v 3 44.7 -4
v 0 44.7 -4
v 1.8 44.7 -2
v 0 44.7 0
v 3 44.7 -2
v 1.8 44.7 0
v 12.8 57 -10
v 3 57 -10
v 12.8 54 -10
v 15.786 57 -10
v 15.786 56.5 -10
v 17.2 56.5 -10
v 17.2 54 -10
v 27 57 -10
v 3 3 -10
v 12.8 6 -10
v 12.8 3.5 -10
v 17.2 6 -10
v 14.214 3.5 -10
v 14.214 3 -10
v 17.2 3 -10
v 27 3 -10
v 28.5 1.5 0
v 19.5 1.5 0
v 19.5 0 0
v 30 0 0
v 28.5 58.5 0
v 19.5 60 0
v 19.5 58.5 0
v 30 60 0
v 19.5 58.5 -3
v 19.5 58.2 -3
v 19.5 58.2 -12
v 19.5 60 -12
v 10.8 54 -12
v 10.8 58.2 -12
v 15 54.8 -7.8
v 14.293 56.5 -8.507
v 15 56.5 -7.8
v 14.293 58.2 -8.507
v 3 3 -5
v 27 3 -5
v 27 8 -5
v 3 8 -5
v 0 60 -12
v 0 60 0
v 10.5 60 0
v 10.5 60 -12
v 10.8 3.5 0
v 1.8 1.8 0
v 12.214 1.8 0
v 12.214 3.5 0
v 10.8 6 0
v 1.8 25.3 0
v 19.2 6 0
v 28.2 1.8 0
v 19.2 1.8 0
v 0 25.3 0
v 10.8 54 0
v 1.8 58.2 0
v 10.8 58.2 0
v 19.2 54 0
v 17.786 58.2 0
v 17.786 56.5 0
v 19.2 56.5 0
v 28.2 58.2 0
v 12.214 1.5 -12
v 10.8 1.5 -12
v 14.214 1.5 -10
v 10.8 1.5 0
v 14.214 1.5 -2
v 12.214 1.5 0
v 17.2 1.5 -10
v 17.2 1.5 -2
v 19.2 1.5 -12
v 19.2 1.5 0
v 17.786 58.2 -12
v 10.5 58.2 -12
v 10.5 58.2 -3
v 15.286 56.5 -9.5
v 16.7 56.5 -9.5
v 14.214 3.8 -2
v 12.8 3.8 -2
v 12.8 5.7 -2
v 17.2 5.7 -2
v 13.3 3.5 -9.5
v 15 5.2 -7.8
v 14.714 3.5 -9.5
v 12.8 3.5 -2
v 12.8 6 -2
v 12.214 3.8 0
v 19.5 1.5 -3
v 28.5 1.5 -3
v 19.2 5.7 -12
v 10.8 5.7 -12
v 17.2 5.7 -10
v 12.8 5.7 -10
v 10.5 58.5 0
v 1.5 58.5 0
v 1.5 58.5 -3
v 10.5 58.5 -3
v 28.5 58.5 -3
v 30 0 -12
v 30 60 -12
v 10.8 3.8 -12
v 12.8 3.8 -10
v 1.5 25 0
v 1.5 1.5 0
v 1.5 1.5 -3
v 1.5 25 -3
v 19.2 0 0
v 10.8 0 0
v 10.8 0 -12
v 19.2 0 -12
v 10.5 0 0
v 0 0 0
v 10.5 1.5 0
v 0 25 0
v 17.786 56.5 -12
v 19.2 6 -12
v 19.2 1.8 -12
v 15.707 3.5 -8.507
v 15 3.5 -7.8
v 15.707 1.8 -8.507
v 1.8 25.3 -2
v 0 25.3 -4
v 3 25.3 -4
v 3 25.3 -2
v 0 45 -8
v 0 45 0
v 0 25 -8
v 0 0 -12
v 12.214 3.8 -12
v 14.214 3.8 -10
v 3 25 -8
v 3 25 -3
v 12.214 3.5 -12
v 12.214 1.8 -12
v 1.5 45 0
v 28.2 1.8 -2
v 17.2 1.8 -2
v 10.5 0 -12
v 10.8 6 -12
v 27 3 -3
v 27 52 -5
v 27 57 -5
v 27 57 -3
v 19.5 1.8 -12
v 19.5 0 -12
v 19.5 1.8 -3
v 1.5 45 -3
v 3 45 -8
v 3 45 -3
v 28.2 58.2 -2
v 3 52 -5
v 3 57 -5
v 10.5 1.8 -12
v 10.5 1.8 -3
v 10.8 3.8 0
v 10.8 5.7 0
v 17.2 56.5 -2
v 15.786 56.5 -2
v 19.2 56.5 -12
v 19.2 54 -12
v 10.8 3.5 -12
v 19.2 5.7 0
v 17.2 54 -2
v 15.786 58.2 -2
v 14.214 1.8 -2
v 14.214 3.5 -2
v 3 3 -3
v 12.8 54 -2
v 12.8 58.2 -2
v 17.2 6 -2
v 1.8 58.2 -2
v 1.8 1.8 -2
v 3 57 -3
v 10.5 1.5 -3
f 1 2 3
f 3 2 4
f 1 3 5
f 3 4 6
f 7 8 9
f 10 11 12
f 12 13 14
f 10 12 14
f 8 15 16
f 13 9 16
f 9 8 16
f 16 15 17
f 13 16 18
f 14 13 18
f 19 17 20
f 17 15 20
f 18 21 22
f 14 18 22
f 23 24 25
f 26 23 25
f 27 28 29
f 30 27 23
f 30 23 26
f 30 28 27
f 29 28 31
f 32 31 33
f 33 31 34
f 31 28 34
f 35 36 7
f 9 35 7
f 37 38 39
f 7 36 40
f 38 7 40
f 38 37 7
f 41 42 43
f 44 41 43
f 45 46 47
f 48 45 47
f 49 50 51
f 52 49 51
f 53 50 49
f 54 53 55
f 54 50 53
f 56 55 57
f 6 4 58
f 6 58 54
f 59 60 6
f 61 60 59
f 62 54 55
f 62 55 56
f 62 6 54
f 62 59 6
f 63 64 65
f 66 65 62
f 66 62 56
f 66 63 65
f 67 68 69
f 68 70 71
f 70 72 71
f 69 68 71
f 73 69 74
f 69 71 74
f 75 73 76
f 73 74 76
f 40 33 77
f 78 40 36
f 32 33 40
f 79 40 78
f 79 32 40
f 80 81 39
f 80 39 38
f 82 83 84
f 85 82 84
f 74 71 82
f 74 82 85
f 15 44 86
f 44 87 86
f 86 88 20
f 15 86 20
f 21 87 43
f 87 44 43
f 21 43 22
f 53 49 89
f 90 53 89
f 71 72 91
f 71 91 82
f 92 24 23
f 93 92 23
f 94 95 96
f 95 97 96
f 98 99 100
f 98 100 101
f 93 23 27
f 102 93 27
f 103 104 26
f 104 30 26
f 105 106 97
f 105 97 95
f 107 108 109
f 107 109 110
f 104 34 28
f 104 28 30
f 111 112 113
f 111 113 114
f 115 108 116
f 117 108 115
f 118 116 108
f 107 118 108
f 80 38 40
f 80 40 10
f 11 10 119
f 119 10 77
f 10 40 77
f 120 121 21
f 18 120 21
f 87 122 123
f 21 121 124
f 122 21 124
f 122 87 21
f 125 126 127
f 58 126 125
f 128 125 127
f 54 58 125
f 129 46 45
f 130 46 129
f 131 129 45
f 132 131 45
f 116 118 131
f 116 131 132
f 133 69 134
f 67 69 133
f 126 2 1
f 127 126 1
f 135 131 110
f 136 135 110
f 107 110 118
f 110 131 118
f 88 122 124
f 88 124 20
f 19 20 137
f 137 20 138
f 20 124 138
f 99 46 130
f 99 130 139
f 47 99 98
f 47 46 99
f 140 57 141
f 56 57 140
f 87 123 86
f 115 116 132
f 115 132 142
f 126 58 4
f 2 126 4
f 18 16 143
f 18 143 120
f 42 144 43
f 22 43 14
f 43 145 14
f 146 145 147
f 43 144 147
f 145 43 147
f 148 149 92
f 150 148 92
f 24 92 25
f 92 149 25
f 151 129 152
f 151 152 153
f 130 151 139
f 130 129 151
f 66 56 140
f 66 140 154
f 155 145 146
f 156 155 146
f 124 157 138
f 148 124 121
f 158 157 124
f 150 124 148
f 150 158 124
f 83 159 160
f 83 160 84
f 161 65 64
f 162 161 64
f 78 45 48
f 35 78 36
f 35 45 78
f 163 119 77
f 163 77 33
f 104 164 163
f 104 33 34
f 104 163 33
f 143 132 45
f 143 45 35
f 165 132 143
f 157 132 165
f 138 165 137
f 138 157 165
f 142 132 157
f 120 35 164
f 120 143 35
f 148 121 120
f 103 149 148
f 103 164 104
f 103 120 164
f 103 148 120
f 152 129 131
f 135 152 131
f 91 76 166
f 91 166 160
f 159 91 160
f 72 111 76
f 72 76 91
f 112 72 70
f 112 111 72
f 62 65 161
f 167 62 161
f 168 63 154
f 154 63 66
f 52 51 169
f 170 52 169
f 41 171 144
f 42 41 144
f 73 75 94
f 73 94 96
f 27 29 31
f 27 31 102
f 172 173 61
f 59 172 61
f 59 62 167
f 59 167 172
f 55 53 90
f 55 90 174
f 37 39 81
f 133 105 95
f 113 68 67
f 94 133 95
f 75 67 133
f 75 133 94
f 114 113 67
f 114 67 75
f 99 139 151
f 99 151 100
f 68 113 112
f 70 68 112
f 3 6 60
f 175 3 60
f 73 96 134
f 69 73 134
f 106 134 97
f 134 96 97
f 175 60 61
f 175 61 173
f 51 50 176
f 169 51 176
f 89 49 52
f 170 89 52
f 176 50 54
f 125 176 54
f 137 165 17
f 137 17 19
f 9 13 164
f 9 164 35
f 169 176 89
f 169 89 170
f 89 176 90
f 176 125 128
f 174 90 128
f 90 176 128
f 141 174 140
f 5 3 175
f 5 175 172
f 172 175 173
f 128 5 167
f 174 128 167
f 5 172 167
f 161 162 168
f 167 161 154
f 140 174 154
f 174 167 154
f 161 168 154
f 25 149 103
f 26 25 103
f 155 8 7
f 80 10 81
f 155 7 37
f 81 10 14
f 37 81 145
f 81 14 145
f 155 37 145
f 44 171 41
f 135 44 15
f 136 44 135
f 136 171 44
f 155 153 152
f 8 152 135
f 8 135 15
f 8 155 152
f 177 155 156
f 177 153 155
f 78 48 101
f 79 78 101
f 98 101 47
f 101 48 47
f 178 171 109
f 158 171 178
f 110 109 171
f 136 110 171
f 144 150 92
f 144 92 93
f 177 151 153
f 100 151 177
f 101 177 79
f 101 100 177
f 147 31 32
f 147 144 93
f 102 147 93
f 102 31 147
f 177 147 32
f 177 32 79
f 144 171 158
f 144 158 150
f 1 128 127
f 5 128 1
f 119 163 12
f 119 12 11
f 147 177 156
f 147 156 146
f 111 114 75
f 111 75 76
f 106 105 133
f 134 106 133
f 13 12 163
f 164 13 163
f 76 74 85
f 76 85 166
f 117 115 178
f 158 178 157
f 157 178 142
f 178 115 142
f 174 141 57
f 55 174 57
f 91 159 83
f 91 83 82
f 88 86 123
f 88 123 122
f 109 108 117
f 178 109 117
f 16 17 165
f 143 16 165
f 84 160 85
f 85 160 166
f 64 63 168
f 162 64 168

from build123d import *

# Parameters (mm, degrees)
F0_W      = 30
F0_H      = 60
F0_W_2    = 27
F0_H_2    = 57
F0_W_3    = 26.4
F0_H_3    = 56.4
F0_W_4    = 24
F0_H_4    = 54
F1_DEPTH  = 10
F2_DEPTH  = 3
F3_W      = 30
F3_H      = 60
F4_DEPTH  = 2
F6_DEPTH  = 24
F7_DEPTH  = 2
F10_DEPTH = 1.8
F11_DEPTH = 6
F12_START = -3.5
F12_DEPTH = 2.5
F14_DEPTH = 1.8
F15_DEPTH = 6
F16_START = -3.5
F16_DEPTH = 2.5
F17_DEPTH = 6
F18_START = -3.5
F18_DEPTH = 2.5
F19_W     = 8.4
F19_H     = 12
F20_DEPTH = 1.5
F21_DEPTH = 5.7
F22_START = -3.8
F22_DEPTH = 1.9
F23_DEPTH = 6
F24_START = -3.5
F24_DEPTH = 2.5
F25_W     = 20
F25_H     = 8
F26_DEPTH = 3
F27_W     = 3
F27_H     = 19.4
F28_DEPTH = 4
F30_DEPTH = 4.2


with BuildPart() as f1:
    # F0 (on Top) → F1 (new body)
    with BuildSketch(Plane.XY):
        with Locations((15, 30)):
            Rectangle(F0_W, F0_H)
        with Locations((15, 30)):
            Rectangle(F0_W_2, F0_H_2, mode=Mode.SUBTRACT)
        with Locations((15, 30)):
            Rectangle(F0_W_2, F0_H_2)
        with Locations((15, 30)):
            Rectangle(F0_W_3, F0_H_3, mode=Mode.SUBTRACT)
        with Locations((15, 30)):
            Rectangle(F0_W_3, F0_H_3)
        with Locations((15, 30)):
            Rectangle(F0_W_4, F0_H_4, mode=Mode.SUBTRACT)
    extrude(amount=-F1_DEPTH)

    # F0 (on Top) → F2 (cut)
    with BuildSketch(Plane.XY):
        with Locations((15, 30)):
            Rectangle(F0_W_2, F0_H_2)
        with Locations((15, 30)):
            Rectangle(F0_W_3, F0_H_3, mode=Mode.SUBTRACT)
        with Locations((15, 30)):
            Rectangle(F0_W_3, F0_H_3)
        with Locations((15, 30)):
            Rectangle(F0_W_4, F0_H_4, mode=Mode.SUBTRACT)
    extrude(amount=-F2_DEPTH, mode=Mode.SUBTRACT)

    # F3 (on face) → F4 (join)
    with BuildSketch(Plane(origin=(0, 0, -10), x_dir=(1, 0, 0), z_dir=(0, 0, -1))):
        with Locations((15, -30)):
            Rectangle(F3_W, F3_H)
    extrude(amount=F4_DEPTH)

    # F5 (on face) → F6 (join, through all)
    with BuildSketch(Plane(origin=(27, 0, 0), x_dir=(0, -1, 0), z_dir=(-1, 0, 0))):
        Polygon((-8, -5), (-3, -10), (-3, -5), align=None)
        Polygon((-57, -5), (-57, -10), (-52, -5), align=None)
    extrude(amount=F6_DEPTH)

    # F9 (on face) → F10 (cut, through all)
    with BuildSketch(Plane.XZ):
        Polygon((10.8, 0), (10.5, 0), (10.5, -12), (10.8, -12), (15, -7.8), (15.7071067812, -8.5071067812), (19.2, -12), (19.5, -12), (19.5, 0), (19.2, 0), (17.2, -2), (14.2142135624, -2), (12.8, -2), align=None)
        Polygon((12.2142135624, 0), (10.8, 0), (12.8, -2), (14.2142135624, -2), align=None)
        Polygon((19.2, 0), (12.2142135624, 0), (14.2142135624, -2), (17.2, -2), align=None)
        Polygon((15.7071067812, -8.5071067812), (12.2142135624, -12), (19.2, -12), align=None)
        Polygon((15, -7.8), (10.8, -12), (12.2142135624, -12), (15.7071067812, -8.5071067812), align=None)
    extrude(amount=-F10_DEPTH, mode=Mode.SUBTRACT)

    # F13 (on face) → F14 (cut, through all)
    with BuildSketch(Plane(origin=(0, 60, 0), x_dir=(-1, 0, 0), z_dir=(0, 1, 0))):
        Polygon((-19.2, 0), (-19.5, 0), (-19.5, -12), (-19.2, -12), (-15, -7.8), (-14.2928932188, -8.5071067812), (-10.8, -12), (-10.5, -12), (-10.5, 0), (-10.8, 0), (-12.8, -2), (-15.7857864376, -2), (-17.2, -2), align=None)
        Polygon((-17.7857864376, 0), (-19.2, 0), (-17.2, -2), (-15.7857864376, -2), align=None)
        Polygon((-10.8, 0), (-17.7857864376, 0), (-15.7857864376, -2), (-12.8, -2), align=None)
        Polygon((-14.2928932188, -8.5071067812), (-17.7857864376, -12), (-10.8, -12), align=None)
        Polygon((-15, -7.8), (-19.2, -12), (-17.7857864376, -12), (-14.2928932188, -8.5071067812), align=None)
    extrude(amount=-F14_DEPTH, mode=Mode.SUBTRACT)

    # F9 (on face) → F17 (cut)
    with BuildSketch(Plane.XZ):
        Polygon((15.7071067812, -8.5071067812), (12.2142135624, -12), (19.2, -12), align=None)
    extrude(amount=-F17_DEPTH, mode=Mode.SUBTRACT)

    # F9 (on face) → F18 (cut)
    with BuildSketch(Plane.XZ.offset(F18_START)):
        Polygon((15, -7.8), (10.8, -12), (12.2142135624, -12), (15.7071067812, -8.5071067812), align=None)
    extrude(amount=-F18_DEPTH, mode=Mode.SUBTRACT)

    # F13 (on face) → F23 (cut)
    with BuildSketch(Plane(origin=(0, 60, 0), x_dir=(-1, 0, 0), z_dir=(0, 1, 0))):
        Polygon((-14.2928932188, -8.5071067812), (-17.7857864376, -12), (-10.8, -12), align=None)
    extrude(amount=-F23_DEPTH, mode=Mode.SUBTRACT)

    # F13 (on face) → F24 (cut)
    with BuildSketch(Plane(origin=(0, 60, 0), x_dir=(-1, 0, 0), z_dir=(0, 1, 0)).offset(F24_START)):
        Polygon((-15, -7.8), (-19.2, -12), (-17.7857864376, -12), (-14.2928932188, -8.5071067812), align=None)
    extrude(amount=-F24_DEPTH, mode=Mode.SUBTRACT)

    # F25 (on face) → F26 (cut, through all)
    with BuildSketch(Plane(origin=(0, 0, 0), x_dir=(0, -1, 0), z_dir=(-1, 0, 0))):
        with Locations((-35, -4)):
            Rectangle(F25_W, F25_H)
    extrude(amount=-F26_DEPTH, mode=Mode.SUBTRACT)


with BuildPart() as f7:
    # F0 (on Top) → F7 (new body)
    with BuildSketch(Plane.XY):
        with Locations((15, 30)):
            Rectangle(F0_W_3, F0_H_3)
        with Locations((15, 30)):
            Rectangle(F0_W_4, F0_H_4, mode=Mode.SUBTRACT)
        with Locations((15, 30)):
            Rectangle(F0_W_4, F0_H_4)
    extrude(amount=-F7_DEPTH)

    # F9 (on face) → F11 (cut)
    with BuildSketch(Plane.XZ):
        Polygon((19.2, 0), (12.2142135624, 0), (14.2142135624, -2), (17.2, -2), align=None)
    extrude(amount=-F11_DEPTH, mode=Mode.SUBTRACT)

    # F9 (on face) → F12 (cut)
    with BuildSketch(Plane.XZ.offset(F12_START)):
        Polygon((12.2142135624, 0), (10.8, 0), (12.8, -2), (14.2142135624, -2), align=None)
    extrude(amount=-F12_DEPTH, mode=Mode.SUBTRACT)

    # F13 (on face) → F15 (cut)
    with BuildSketch(Plane(origin=(0, 60, 0), x_dir=(-1, 0, 0), z_dir=(0, 1, 0))):
        Polygon((-10.8, 0), (-17.7857864376, 0), (-15.7857864376, -2), (-12.8, -2), align=None)
    extrude(amount=-F15_DEPTH, mode=Mode.SUBTRACT)

    # F13 (on face) → F16 (cut)
    with BuildSketch(Plane(origin=(0, 60, 0), x_dir=(-1, 0, 0), z_dir=(0, 1, 0)).offset(F16_START)):
        Polygon((-17.7857864376, 0), (-19.2, 0), (-17.2, -2), (-15.7857864376, -2), align=None)
    extrude(amount=-F16_DEPTH, mode=Mode.SUBTRACT)

    # F27 (on face) → F28 (join)
    with BuildSketch(Plane.XY):
        with Locations((1.5, 35)):
            Rectangle(F27_W, F27_H)
    extrude(amount=-F28_DEPTH)


with BuildPart() as f20:
    # F19 (on face) → F20 (new body)
    with BuildSketch(Plane.XZ):
        with Locations((15, -6)):
            Rectangle(F19_W, F19_H)
    extrude(amount=-F20_DEPTH)

    # F9 (on face) → F21 (join)
    with BuildSketch(Plane.XZ):
        Polygon((19.2, 0), (12.2142135624, 0), (14.2142135624, -2), (17.2, -2), align=None)
        Polygon((15.7071067812, -8.5071067812), (12.2142135624, -12), (19.2, -12), align=None)
    extrude(amount=-F21_DEPTH)

    # F9 (on face) → F22 (join)
    with BuildSketch(Plane.XZ.offset(F22_START)):
        Polygon((12.2142135624, 0), (10.8, 0), (12.8, -2), (14.2142135624, -2), align=None)
        Polygon((15, -7.8), (10.8, -12), (12.2142135624, -12), (15.7071067812, -8.5071067812), align=None)
    extrude(amount=-F22_DEPTH)

    # F29 (on face) → F30 (cut, through all)
    with BuildSketch(Plane(origin=(0, 5.7, 0), x_dir=(-1, 0, 0), z_dir=(0, 1, 0))):
        Polygon((-12.8, -10), (-15, -7.8), (-17.2, -10), align=None)
    extrude(amount=-F30_DEPTH, mode=Mode.SUBTRACT)


solid = Compound([f1.part, f7.part, f20.part])
